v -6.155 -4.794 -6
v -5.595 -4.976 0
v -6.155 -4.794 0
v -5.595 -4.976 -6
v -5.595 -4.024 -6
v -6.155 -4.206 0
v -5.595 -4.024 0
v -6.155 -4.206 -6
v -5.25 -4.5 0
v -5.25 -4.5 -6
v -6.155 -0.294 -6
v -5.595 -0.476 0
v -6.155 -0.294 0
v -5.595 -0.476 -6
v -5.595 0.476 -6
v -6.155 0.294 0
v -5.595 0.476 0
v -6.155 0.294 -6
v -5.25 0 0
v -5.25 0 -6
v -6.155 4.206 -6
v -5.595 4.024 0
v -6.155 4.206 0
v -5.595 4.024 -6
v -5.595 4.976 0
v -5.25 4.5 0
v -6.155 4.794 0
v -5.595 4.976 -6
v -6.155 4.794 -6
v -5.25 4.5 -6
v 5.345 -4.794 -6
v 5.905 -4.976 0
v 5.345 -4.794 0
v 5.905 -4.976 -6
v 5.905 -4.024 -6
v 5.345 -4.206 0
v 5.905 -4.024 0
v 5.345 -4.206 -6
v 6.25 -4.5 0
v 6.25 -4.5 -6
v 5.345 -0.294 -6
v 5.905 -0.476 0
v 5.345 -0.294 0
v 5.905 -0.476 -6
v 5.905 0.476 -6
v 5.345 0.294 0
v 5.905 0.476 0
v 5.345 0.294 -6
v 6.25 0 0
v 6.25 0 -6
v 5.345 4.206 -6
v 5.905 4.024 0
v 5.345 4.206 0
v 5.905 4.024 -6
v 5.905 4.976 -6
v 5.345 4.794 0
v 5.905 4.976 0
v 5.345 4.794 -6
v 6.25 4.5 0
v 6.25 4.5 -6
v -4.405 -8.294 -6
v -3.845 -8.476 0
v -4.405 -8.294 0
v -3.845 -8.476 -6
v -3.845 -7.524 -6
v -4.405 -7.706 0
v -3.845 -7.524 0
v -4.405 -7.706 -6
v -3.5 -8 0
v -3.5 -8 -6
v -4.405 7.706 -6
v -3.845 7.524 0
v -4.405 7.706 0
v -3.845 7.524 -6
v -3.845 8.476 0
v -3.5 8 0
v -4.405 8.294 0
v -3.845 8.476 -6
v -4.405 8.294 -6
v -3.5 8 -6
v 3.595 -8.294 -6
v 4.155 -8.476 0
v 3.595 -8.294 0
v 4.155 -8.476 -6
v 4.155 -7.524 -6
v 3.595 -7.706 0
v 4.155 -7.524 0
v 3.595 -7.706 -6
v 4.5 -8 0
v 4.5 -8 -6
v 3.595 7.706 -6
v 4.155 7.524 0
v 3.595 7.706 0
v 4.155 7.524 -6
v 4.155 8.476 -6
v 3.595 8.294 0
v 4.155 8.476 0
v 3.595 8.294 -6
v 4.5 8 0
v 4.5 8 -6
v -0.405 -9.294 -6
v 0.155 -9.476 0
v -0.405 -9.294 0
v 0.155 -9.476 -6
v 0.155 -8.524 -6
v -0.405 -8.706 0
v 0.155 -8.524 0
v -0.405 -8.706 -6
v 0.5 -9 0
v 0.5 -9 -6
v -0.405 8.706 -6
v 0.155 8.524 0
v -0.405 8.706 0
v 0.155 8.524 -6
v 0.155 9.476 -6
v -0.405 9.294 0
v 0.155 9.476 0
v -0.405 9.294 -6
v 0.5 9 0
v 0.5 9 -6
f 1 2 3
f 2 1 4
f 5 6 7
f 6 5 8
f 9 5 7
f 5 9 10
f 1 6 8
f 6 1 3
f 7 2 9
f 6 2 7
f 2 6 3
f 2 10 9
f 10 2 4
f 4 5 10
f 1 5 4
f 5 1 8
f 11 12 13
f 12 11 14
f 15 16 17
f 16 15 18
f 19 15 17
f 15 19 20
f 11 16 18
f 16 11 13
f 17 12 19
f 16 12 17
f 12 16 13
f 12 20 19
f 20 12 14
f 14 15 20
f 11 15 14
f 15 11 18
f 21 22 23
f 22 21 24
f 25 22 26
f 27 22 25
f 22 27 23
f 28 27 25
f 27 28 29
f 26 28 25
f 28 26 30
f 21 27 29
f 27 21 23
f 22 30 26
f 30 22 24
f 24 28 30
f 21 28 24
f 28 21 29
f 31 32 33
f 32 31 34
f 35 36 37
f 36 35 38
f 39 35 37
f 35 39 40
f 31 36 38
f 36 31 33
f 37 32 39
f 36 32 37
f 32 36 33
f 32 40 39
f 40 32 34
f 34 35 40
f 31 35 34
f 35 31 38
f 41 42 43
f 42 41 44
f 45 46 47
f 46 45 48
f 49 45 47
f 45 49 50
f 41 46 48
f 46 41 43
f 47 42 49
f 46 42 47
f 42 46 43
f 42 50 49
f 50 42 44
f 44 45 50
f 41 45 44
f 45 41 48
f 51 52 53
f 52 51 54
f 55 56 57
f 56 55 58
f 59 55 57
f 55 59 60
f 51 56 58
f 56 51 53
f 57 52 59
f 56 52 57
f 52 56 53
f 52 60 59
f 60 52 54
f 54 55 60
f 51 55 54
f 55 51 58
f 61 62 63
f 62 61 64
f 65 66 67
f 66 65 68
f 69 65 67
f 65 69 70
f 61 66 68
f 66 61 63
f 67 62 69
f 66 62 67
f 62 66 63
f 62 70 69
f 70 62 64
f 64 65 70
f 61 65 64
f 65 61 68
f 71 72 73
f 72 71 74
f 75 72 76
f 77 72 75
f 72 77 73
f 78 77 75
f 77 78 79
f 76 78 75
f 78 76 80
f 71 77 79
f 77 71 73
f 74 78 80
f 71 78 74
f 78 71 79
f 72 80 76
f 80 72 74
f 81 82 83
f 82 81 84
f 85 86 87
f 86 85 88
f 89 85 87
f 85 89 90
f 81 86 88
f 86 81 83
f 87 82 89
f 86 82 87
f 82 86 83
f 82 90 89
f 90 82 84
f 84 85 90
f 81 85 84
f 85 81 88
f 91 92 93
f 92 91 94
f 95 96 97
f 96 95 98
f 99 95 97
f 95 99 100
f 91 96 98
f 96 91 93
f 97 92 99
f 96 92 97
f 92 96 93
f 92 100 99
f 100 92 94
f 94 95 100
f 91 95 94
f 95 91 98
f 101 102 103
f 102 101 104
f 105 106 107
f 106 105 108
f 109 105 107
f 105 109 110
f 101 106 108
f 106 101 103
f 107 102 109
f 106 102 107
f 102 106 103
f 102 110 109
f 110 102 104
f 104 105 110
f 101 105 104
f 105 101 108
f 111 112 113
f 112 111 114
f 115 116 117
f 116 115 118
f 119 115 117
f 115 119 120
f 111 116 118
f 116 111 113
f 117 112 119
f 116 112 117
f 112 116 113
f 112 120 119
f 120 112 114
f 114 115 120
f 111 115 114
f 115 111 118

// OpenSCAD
//
// IN-12 nixie
//

spd = 80;

module pin() {
     cylinder( d=1, h=6);
}

module nixie() {
     % intersection() {
	  cylinder( r=29/2, h=28);
	  translate( [-19.7/2, -30/2, 0])
	       cube( [19.7, 30, 28]);
	  translate( [0, 0, -(spd/2-27)])
	       sphere( d=spd);
     }
     translate( [0, 0, -6]) {
	  for( x=[0:1]) {
	       for( y=[0:2]) {
		    translate( [-11.5/2+x*11.5, -4.5+y*4.5, 0])
			 pin();
	       }
	  }
	  for( x=[0:1]) {
	       for( y=[0:1]) {
		    translate( [-8/2+x*8, -8+y*16, 0])
			 pin();
	       }
	  }
	  translate( [0, -9, 0]) pin();
	  translate( [0, 9, 0]) pin();
     }
}

nixie();
